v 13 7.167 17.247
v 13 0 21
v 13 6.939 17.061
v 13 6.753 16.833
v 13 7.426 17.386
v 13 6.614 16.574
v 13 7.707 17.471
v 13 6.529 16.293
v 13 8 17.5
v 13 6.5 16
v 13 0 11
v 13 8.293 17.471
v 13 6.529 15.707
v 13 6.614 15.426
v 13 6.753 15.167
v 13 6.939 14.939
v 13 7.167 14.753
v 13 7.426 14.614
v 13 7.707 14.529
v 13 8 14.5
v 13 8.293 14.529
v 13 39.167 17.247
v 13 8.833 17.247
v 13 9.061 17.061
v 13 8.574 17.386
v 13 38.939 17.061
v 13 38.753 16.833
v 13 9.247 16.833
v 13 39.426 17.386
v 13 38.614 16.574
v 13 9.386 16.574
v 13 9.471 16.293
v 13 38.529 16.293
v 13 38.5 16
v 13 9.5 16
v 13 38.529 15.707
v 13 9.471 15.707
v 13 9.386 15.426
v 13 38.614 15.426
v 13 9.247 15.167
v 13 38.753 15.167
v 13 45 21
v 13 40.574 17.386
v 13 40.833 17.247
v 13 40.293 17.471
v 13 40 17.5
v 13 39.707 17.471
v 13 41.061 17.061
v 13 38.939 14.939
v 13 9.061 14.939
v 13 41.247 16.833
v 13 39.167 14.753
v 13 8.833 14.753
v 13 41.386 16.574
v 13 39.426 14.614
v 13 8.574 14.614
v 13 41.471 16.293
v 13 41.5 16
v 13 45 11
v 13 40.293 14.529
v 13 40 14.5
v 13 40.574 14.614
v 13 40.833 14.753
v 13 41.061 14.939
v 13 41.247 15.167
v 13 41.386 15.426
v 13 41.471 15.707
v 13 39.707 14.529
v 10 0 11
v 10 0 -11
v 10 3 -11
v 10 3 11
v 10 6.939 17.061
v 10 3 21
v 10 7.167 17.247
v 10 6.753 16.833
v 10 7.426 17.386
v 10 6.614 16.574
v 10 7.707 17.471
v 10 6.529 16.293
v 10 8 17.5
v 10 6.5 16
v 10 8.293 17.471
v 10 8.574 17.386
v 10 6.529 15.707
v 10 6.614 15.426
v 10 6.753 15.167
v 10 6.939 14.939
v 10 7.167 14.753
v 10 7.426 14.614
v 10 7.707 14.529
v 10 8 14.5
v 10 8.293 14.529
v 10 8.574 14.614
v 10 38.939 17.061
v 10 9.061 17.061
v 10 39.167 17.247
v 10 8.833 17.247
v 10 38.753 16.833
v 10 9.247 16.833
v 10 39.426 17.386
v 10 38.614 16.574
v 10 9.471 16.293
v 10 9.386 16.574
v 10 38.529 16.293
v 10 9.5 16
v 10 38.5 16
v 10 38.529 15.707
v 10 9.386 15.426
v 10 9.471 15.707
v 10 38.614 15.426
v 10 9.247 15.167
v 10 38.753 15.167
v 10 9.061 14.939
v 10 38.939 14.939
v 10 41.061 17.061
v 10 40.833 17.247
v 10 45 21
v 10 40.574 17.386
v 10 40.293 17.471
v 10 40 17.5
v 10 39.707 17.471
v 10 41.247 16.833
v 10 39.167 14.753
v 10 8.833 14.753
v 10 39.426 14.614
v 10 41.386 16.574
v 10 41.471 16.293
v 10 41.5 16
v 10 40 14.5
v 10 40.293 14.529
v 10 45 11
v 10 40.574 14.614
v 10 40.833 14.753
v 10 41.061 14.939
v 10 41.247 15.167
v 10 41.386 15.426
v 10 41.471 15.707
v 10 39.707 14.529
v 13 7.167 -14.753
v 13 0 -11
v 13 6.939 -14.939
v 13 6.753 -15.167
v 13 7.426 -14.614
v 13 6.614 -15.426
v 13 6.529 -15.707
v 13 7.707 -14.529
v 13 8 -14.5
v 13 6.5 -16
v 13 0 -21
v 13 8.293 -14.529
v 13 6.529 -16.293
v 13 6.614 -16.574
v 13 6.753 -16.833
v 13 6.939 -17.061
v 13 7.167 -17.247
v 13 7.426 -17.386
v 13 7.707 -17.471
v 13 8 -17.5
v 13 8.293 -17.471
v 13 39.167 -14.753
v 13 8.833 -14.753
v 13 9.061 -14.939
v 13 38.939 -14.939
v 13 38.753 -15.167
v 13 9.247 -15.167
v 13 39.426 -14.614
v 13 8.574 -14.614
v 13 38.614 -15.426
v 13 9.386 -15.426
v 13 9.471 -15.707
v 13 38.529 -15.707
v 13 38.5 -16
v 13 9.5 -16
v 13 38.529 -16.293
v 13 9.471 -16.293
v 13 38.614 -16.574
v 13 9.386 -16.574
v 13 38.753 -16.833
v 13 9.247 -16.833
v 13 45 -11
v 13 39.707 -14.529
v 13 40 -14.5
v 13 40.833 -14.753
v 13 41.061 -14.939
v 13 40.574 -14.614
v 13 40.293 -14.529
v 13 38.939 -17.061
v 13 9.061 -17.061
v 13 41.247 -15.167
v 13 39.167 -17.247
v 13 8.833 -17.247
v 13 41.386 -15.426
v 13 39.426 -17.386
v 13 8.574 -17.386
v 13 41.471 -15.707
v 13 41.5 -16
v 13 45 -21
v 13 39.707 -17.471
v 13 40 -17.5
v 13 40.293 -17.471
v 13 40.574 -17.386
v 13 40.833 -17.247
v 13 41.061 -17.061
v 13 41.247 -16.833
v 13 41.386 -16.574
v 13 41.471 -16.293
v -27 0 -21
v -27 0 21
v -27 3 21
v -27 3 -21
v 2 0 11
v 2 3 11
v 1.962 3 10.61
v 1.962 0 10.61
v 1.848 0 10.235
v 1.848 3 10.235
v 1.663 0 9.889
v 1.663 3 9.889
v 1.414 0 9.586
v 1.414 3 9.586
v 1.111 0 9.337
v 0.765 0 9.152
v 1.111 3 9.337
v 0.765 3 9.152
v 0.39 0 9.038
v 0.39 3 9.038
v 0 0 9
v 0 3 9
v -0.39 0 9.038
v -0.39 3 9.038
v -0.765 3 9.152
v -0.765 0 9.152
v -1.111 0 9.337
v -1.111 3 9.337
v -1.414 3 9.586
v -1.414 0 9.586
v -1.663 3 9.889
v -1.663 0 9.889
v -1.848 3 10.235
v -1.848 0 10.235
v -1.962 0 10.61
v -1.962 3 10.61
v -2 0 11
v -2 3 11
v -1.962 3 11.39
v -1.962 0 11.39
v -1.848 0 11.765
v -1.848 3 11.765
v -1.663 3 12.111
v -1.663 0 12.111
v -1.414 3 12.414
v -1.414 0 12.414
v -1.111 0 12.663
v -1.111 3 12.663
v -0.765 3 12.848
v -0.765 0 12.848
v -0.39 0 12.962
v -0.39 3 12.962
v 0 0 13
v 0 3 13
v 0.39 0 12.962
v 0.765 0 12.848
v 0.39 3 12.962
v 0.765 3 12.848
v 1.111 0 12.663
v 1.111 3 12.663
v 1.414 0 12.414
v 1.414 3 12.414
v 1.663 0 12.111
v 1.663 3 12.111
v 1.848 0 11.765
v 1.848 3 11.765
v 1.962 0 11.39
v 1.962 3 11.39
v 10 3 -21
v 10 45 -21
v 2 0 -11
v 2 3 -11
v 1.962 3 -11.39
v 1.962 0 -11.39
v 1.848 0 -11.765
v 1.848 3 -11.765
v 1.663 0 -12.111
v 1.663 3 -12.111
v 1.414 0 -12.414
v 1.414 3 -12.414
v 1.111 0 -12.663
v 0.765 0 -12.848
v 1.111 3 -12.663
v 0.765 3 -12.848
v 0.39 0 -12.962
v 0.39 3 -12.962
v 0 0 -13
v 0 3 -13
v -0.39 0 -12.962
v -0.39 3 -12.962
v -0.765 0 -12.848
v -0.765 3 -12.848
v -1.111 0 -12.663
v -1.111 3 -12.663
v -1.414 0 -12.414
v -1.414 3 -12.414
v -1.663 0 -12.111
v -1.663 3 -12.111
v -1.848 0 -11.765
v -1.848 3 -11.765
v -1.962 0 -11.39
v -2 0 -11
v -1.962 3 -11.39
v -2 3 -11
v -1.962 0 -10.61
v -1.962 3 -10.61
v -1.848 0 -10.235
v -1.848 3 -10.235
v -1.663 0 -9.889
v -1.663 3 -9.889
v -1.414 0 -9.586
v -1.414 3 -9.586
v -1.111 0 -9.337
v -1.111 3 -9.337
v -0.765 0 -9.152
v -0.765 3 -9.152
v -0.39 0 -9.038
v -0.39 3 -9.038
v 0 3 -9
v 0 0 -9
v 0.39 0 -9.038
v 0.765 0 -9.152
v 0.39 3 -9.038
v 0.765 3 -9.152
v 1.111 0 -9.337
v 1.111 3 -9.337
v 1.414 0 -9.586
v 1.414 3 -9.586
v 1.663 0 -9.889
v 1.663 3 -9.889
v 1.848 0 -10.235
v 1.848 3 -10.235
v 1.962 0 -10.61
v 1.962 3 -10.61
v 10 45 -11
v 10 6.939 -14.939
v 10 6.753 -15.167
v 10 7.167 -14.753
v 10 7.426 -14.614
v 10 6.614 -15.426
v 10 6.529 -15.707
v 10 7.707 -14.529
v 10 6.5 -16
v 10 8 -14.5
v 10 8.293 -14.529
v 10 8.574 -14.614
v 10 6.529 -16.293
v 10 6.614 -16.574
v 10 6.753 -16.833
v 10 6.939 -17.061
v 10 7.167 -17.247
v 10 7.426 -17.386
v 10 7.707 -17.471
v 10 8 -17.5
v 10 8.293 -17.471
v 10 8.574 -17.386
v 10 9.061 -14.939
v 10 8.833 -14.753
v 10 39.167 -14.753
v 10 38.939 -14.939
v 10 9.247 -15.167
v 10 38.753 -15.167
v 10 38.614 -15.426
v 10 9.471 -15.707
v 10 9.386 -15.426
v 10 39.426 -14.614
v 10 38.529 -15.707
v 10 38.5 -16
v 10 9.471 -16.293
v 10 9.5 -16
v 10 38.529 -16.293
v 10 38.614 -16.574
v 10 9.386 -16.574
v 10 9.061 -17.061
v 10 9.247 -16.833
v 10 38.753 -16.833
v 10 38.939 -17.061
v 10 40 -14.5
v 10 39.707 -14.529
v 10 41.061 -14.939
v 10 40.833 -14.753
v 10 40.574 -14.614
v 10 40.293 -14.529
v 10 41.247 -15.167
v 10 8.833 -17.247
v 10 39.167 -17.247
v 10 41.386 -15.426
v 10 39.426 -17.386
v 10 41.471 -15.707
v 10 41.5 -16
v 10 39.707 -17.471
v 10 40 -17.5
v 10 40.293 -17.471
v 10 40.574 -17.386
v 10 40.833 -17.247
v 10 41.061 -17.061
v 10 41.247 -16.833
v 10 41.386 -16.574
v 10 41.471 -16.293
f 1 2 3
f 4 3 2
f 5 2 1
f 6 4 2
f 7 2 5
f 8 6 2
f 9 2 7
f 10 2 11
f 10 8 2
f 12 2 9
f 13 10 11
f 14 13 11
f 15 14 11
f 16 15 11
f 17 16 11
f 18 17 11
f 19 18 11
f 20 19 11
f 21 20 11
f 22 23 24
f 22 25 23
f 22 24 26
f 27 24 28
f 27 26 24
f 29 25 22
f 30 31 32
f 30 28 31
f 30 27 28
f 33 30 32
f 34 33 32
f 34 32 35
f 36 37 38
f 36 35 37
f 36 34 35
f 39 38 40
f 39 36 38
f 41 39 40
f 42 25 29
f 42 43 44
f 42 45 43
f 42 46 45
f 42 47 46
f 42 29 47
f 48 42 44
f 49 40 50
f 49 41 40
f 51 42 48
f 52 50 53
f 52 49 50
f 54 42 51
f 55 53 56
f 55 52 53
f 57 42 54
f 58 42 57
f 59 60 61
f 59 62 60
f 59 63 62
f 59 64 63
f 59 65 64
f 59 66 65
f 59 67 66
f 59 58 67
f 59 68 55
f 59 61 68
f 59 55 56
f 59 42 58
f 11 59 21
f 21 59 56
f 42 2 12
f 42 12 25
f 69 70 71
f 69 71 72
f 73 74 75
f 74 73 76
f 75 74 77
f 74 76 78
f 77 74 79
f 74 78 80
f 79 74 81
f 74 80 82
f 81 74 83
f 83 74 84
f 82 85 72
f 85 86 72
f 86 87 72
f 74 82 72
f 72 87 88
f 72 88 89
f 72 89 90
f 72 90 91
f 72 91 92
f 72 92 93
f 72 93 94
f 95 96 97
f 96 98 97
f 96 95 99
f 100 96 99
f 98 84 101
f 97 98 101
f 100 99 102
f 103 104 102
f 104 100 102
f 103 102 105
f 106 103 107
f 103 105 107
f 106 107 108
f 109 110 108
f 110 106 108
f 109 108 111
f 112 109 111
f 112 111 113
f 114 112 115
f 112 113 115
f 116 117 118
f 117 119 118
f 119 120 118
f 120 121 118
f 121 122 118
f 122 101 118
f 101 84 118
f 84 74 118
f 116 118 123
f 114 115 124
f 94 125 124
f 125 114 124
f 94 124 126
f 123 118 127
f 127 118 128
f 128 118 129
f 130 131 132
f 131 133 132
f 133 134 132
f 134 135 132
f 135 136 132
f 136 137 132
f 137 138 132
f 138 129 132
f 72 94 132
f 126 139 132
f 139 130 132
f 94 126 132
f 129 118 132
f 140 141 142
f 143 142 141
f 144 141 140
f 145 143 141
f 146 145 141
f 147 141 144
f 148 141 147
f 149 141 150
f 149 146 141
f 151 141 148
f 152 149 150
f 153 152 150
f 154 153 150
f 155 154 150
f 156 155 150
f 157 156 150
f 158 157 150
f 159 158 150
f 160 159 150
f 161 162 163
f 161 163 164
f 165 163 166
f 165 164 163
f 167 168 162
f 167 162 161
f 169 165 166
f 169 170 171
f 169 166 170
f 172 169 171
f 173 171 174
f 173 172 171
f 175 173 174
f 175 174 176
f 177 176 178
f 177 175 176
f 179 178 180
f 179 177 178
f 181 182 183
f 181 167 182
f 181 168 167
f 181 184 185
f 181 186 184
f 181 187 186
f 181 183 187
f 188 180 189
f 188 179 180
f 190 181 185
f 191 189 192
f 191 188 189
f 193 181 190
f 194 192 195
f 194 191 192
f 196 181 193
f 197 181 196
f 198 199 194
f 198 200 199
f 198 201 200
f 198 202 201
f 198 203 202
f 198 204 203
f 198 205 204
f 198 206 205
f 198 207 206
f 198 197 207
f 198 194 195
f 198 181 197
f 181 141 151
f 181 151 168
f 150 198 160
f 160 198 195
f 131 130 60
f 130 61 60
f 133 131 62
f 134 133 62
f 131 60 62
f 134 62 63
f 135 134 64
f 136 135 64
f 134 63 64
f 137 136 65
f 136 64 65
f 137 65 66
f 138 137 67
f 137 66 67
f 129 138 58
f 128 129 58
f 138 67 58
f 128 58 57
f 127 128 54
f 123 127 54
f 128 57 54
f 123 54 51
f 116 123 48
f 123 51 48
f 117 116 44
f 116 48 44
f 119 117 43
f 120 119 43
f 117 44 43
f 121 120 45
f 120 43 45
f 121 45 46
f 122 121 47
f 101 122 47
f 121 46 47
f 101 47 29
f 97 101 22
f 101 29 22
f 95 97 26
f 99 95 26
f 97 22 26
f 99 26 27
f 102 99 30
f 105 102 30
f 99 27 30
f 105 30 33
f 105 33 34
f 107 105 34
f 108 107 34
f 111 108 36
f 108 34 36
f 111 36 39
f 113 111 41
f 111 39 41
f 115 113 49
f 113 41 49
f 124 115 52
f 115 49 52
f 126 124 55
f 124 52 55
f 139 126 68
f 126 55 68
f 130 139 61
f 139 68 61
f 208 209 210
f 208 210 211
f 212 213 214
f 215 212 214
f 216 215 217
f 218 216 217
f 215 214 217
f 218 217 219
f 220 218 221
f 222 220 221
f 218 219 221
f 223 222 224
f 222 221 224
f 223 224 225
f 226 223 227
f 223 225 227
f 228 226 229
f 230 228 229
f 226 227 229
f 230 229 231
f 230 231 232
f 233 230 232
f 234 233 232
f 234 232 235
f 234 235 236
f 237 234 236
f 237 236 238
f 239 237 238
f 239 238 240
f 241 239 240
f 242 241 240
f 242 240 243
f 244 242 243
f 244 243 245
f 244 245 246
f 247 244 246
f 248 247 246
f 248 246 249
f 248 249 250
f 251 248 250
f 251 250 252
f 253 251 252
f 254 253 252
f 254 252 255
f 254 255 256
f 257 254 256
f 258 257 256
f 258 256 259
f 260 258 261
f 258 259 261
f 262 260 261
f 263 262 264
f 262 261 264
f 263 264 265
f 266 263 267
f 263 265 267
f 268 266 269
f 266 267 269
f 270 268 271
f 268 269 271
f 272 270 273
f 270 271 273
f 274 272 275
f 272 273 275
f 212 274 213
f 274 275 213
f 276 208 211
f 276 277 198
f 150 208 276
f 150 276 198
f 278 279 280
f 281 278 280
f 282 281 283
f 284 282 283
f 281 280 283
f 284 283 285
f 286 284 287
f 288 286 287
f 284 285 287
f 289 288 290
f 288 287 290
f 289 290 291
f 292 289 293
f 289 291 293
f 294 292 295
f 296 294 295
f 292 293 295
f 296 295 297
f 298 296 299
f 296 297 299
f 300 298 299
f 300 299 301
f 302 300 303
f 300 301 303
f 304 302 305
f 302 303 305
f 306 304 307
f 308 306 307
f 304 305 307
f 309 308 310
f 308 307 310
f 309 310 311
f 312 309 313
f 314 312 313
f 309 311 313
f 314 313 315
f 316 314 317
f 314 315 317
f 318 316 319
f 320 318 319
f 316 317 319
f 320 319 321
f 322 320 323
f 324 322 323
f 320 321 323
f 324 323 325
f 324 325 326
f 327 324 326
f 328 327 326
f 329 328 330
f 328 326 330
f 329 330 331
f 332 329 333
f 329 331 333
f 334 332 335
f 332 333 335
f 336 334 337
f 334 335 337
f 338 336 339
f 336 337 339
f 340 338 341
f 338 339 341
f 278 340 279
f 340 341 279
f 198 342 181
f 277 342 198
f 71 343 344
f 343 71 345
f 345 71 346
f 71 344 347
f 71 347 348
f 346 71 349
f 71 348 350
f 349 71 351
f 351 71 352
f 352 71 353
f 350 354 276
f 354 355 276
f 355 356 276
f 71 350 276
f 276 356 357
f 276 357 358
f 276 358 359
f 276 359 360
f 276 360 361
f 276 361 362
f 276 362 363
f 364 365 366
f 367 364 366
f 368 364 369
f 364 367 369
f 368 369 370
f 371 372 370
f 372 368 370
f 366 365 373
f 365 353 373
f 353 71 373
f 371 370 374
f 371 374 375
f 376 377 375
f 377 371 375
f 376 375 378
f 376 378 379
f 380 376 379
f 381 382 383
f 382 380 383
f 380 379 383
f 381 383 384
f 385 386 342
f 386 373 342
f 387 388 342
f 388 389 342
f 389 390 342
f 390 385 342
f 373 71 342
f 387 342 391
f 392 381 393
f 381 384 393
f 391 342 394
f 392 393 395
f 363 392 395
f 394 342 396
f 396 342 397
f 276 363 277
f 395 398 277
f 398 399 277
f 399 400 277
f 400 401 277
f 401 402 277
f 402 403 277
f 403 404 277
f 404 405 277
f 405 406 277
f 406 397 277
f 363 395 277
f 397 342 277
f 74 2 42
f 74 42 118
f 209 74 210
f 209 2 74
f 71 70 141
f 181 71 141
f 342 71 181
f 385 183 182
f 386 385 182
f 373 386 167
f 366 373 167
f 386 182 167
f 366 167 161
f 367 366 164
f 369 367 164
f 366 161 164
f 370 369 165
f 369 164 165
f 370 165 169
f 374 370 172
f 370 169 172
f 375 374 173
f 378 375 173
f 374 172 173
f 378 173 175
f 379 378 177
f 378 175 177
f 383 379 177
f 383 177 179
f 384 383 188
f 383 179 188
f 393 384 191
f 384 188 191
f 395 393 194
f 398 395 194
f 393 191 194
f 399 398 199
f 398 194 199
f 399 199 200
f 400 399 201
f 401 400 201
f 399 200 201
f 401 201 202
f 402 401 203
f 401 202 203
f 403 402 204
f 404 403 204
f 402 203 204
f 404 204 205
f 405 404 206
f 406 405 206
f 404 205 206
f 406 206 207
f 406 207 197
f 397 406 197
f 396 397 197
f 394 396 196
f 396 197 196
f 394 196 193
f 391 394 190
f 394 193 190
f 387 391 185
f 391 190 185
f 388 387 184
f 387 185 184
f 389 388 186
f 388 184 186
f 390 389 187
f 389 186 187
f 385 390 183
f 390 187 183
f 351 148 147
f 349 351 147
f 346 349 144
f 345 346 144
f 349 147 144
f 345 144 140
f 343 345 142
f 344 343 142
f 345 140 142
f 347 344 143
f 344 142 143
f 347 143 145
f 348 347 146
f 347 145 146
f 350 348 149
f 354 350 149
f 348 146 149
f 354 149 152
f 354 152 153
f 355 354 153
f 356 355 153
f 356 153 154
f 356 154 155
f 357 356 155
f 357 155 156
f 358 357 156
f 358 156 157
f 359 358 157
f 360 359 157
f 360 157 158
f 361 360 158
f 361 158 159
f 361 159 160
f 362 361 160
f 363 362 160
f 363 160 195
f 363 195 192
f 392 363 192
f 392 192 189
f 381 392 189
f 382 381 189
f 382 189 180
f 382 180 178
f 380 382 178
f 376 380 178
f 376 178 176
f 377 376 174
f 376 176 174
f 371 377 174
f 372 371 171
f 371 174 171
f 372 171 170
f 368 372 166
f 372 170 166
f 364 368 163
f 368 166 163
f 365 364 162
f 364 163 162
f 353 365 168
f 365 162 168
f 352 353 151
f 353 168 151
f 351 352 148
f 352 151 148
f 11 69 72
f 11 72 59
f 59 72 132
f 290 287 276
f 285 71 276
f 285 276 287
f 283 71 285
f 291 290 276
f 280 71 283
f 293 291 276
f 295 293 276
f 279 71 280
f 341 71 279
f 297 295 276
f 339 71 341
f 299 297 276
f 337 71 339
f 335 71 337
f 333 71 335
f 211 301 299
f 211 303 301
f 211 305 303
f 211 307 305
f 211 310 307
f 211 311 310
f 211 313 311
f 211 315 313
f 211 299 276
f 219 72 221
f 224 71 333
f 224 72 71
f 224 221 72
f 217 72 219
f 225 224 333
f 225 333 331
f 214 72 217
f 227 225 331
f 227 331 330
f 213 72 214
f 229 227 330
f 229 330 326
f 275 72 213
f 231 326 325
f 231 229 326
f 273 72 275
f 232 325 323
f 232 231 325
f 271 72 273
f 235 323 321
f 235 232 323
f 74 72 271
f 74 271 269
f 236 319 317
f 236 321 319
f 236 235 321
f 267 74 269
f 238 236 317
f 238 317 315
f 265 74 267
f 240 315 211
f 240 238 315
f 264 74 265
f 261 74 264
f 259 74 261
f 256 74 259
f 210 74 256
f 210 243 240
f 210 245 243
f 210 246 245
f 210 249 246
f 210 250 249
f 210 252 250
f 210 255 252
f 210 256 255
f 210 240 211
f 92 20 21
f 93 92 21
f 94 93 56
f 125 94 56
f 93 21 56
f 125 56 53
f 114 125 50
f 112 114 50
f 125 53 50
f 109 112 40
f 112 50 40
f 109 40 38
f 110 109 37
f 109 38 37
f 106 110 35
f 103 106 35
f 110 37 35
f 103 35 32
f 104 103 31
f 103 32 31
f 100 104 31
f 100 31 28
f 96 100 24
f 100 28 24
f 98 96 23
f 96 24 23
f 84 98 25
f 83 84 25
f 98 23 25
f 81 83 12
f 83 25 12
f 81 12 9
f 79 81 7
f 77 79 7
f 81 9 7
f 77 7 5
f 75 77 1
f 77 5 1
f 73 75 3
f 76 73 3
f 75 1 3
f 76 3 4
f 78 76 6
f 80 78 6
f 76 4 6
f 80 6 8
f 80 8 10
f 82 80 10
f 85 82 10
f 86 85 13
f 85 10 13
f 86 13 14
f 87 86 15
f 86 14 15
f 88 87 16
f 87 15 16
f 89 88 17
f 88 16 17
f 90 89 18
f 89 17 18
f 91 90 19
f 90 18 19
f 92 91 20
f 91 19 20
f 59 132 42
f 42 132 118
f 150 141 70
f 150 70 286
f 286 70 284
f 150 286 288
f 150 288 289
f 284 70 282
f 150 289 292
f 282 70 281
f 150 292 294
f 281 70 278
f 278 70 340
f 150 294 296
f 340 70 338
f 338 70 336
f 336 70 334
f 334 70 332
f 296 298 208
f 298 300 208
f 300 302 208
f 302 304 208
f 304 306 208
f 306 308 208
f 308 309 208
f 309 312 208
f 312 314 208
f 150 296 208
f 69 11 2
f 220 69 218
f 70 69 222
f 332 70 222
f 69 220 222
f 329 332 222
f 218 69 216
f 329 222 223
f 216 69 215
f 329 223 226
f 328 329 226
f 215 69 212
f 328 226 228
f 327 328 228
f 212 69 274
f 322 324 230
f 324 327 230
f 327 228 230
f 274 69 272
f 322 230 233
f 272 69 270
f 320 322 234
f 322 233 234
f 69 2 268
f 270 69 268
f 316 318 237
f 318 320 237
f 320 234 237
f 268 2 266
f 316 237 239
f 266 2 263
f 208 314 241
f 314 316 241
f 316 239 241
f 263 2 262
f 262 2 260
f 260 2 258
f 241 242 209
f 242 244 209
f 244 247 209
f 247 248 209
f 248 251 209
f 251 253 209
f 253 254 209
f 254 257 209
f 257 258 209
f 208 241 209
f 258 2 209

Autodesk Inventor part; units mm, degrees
ref_plane "YZ Plane" through (0, 0, 0) normal (1, 0, 0) x (0, 1, 0)
ref_plane "XZ Plane" through (0, 0, 0) normal (0, 1, 0) x (-1, 0, 0)
ref_plane "XY Plane" through (0, 0, 0) normal (0, 0, 1) x (1, 0, 0)
sketch "Sketch1" plane through (0, 0, 0) normal (0, 1, 0) x (-1, 0, 0)
  line L0 (-10, 21) -> (10, 21)
  line L1 (10, 21) -> (10, -21)
  line L2 (10, -21) -> (-10, -21)
  line L3 (-10, -21) -> (-10, 21)
  line L4 (-10, 21) -> (10, -21) construction
  line L5 (10, 21) -> (-10, -21) construction
  point P0 (0, 0)
  dimension "d0" = 20
  dimension "d1" = 42
extrude "Extrusion1" add sketch "Sketch1" along normal blind 3
sketch "Sketch2" plane through (10, 0, 21) normal (1, 0, 0) x (0, 0, -1)
  line L0 (0, 0) -> (10, 0)
  line L1 (10, 0) -> (10, 45)
  line L2 (10, 45) -> (0, 45)
  line L3 (0, 45) -> (0, 0)
  line L4 (42, 0) -> (0, 0) projected
  line L5 (42, 0) -> (32, 0)
  line L6 (32, 0) -> (32, 45)
  line L7 (32, 45) -> (42, 45)
  line L8 (42, 45) -> (42, 0)
  point P0 (21, 0)
  dimension "d4" = 10
  dimension "d5" = 45
  dimension "d6" = 10
  dimension "d7" = 45
extrude "Extrusion2" add sketch "Sketch2" along normal blind 3
sketch "Sketch3" plane through (13, 0, 21) normal (1, 0, 0) x (0, 0, -1)
  circle A0 centre (5, 40) radius 1.5
  circle A1 centre (5, 8) radius 1.5
  point P0 (21, 0)
  dimension "d10" = 3
  dimension "d11" = 3
extrude "Extrusion3" cut sketch "Sketch3" against normal blind 3
mirror "Mirror1" about plane through (0, 0, 0) normal (0, 0, 1) of "Extrusion3"
sketch "Sketch5" plane through (0, 3, 0) normal (0, 1, 0) x (1, 0, 0)
  circle A0 centre (0, -11) radius 2
  circle A1 centre (0, 11) radius 2
  point P0 (0, 0)
  dimension "d18" = 4
  dimension "d19" = 4
extrude "Extrusion5" cut sketch "Sketch5" against normal blind 3
sketch "Sketch6" plane through (0, 3, 0) normal (0, 1, 0) x (1, 0, 0)
  point P0 (0, 0)
thicken "Thicken1" operation add thickness 17 both sides no extend neighbours yes toward (-1, 0, 0) faces at (-10, 1, -7)
properties part number "vertical_axis_motor_metal_holder" material "Aluminum 6061"
